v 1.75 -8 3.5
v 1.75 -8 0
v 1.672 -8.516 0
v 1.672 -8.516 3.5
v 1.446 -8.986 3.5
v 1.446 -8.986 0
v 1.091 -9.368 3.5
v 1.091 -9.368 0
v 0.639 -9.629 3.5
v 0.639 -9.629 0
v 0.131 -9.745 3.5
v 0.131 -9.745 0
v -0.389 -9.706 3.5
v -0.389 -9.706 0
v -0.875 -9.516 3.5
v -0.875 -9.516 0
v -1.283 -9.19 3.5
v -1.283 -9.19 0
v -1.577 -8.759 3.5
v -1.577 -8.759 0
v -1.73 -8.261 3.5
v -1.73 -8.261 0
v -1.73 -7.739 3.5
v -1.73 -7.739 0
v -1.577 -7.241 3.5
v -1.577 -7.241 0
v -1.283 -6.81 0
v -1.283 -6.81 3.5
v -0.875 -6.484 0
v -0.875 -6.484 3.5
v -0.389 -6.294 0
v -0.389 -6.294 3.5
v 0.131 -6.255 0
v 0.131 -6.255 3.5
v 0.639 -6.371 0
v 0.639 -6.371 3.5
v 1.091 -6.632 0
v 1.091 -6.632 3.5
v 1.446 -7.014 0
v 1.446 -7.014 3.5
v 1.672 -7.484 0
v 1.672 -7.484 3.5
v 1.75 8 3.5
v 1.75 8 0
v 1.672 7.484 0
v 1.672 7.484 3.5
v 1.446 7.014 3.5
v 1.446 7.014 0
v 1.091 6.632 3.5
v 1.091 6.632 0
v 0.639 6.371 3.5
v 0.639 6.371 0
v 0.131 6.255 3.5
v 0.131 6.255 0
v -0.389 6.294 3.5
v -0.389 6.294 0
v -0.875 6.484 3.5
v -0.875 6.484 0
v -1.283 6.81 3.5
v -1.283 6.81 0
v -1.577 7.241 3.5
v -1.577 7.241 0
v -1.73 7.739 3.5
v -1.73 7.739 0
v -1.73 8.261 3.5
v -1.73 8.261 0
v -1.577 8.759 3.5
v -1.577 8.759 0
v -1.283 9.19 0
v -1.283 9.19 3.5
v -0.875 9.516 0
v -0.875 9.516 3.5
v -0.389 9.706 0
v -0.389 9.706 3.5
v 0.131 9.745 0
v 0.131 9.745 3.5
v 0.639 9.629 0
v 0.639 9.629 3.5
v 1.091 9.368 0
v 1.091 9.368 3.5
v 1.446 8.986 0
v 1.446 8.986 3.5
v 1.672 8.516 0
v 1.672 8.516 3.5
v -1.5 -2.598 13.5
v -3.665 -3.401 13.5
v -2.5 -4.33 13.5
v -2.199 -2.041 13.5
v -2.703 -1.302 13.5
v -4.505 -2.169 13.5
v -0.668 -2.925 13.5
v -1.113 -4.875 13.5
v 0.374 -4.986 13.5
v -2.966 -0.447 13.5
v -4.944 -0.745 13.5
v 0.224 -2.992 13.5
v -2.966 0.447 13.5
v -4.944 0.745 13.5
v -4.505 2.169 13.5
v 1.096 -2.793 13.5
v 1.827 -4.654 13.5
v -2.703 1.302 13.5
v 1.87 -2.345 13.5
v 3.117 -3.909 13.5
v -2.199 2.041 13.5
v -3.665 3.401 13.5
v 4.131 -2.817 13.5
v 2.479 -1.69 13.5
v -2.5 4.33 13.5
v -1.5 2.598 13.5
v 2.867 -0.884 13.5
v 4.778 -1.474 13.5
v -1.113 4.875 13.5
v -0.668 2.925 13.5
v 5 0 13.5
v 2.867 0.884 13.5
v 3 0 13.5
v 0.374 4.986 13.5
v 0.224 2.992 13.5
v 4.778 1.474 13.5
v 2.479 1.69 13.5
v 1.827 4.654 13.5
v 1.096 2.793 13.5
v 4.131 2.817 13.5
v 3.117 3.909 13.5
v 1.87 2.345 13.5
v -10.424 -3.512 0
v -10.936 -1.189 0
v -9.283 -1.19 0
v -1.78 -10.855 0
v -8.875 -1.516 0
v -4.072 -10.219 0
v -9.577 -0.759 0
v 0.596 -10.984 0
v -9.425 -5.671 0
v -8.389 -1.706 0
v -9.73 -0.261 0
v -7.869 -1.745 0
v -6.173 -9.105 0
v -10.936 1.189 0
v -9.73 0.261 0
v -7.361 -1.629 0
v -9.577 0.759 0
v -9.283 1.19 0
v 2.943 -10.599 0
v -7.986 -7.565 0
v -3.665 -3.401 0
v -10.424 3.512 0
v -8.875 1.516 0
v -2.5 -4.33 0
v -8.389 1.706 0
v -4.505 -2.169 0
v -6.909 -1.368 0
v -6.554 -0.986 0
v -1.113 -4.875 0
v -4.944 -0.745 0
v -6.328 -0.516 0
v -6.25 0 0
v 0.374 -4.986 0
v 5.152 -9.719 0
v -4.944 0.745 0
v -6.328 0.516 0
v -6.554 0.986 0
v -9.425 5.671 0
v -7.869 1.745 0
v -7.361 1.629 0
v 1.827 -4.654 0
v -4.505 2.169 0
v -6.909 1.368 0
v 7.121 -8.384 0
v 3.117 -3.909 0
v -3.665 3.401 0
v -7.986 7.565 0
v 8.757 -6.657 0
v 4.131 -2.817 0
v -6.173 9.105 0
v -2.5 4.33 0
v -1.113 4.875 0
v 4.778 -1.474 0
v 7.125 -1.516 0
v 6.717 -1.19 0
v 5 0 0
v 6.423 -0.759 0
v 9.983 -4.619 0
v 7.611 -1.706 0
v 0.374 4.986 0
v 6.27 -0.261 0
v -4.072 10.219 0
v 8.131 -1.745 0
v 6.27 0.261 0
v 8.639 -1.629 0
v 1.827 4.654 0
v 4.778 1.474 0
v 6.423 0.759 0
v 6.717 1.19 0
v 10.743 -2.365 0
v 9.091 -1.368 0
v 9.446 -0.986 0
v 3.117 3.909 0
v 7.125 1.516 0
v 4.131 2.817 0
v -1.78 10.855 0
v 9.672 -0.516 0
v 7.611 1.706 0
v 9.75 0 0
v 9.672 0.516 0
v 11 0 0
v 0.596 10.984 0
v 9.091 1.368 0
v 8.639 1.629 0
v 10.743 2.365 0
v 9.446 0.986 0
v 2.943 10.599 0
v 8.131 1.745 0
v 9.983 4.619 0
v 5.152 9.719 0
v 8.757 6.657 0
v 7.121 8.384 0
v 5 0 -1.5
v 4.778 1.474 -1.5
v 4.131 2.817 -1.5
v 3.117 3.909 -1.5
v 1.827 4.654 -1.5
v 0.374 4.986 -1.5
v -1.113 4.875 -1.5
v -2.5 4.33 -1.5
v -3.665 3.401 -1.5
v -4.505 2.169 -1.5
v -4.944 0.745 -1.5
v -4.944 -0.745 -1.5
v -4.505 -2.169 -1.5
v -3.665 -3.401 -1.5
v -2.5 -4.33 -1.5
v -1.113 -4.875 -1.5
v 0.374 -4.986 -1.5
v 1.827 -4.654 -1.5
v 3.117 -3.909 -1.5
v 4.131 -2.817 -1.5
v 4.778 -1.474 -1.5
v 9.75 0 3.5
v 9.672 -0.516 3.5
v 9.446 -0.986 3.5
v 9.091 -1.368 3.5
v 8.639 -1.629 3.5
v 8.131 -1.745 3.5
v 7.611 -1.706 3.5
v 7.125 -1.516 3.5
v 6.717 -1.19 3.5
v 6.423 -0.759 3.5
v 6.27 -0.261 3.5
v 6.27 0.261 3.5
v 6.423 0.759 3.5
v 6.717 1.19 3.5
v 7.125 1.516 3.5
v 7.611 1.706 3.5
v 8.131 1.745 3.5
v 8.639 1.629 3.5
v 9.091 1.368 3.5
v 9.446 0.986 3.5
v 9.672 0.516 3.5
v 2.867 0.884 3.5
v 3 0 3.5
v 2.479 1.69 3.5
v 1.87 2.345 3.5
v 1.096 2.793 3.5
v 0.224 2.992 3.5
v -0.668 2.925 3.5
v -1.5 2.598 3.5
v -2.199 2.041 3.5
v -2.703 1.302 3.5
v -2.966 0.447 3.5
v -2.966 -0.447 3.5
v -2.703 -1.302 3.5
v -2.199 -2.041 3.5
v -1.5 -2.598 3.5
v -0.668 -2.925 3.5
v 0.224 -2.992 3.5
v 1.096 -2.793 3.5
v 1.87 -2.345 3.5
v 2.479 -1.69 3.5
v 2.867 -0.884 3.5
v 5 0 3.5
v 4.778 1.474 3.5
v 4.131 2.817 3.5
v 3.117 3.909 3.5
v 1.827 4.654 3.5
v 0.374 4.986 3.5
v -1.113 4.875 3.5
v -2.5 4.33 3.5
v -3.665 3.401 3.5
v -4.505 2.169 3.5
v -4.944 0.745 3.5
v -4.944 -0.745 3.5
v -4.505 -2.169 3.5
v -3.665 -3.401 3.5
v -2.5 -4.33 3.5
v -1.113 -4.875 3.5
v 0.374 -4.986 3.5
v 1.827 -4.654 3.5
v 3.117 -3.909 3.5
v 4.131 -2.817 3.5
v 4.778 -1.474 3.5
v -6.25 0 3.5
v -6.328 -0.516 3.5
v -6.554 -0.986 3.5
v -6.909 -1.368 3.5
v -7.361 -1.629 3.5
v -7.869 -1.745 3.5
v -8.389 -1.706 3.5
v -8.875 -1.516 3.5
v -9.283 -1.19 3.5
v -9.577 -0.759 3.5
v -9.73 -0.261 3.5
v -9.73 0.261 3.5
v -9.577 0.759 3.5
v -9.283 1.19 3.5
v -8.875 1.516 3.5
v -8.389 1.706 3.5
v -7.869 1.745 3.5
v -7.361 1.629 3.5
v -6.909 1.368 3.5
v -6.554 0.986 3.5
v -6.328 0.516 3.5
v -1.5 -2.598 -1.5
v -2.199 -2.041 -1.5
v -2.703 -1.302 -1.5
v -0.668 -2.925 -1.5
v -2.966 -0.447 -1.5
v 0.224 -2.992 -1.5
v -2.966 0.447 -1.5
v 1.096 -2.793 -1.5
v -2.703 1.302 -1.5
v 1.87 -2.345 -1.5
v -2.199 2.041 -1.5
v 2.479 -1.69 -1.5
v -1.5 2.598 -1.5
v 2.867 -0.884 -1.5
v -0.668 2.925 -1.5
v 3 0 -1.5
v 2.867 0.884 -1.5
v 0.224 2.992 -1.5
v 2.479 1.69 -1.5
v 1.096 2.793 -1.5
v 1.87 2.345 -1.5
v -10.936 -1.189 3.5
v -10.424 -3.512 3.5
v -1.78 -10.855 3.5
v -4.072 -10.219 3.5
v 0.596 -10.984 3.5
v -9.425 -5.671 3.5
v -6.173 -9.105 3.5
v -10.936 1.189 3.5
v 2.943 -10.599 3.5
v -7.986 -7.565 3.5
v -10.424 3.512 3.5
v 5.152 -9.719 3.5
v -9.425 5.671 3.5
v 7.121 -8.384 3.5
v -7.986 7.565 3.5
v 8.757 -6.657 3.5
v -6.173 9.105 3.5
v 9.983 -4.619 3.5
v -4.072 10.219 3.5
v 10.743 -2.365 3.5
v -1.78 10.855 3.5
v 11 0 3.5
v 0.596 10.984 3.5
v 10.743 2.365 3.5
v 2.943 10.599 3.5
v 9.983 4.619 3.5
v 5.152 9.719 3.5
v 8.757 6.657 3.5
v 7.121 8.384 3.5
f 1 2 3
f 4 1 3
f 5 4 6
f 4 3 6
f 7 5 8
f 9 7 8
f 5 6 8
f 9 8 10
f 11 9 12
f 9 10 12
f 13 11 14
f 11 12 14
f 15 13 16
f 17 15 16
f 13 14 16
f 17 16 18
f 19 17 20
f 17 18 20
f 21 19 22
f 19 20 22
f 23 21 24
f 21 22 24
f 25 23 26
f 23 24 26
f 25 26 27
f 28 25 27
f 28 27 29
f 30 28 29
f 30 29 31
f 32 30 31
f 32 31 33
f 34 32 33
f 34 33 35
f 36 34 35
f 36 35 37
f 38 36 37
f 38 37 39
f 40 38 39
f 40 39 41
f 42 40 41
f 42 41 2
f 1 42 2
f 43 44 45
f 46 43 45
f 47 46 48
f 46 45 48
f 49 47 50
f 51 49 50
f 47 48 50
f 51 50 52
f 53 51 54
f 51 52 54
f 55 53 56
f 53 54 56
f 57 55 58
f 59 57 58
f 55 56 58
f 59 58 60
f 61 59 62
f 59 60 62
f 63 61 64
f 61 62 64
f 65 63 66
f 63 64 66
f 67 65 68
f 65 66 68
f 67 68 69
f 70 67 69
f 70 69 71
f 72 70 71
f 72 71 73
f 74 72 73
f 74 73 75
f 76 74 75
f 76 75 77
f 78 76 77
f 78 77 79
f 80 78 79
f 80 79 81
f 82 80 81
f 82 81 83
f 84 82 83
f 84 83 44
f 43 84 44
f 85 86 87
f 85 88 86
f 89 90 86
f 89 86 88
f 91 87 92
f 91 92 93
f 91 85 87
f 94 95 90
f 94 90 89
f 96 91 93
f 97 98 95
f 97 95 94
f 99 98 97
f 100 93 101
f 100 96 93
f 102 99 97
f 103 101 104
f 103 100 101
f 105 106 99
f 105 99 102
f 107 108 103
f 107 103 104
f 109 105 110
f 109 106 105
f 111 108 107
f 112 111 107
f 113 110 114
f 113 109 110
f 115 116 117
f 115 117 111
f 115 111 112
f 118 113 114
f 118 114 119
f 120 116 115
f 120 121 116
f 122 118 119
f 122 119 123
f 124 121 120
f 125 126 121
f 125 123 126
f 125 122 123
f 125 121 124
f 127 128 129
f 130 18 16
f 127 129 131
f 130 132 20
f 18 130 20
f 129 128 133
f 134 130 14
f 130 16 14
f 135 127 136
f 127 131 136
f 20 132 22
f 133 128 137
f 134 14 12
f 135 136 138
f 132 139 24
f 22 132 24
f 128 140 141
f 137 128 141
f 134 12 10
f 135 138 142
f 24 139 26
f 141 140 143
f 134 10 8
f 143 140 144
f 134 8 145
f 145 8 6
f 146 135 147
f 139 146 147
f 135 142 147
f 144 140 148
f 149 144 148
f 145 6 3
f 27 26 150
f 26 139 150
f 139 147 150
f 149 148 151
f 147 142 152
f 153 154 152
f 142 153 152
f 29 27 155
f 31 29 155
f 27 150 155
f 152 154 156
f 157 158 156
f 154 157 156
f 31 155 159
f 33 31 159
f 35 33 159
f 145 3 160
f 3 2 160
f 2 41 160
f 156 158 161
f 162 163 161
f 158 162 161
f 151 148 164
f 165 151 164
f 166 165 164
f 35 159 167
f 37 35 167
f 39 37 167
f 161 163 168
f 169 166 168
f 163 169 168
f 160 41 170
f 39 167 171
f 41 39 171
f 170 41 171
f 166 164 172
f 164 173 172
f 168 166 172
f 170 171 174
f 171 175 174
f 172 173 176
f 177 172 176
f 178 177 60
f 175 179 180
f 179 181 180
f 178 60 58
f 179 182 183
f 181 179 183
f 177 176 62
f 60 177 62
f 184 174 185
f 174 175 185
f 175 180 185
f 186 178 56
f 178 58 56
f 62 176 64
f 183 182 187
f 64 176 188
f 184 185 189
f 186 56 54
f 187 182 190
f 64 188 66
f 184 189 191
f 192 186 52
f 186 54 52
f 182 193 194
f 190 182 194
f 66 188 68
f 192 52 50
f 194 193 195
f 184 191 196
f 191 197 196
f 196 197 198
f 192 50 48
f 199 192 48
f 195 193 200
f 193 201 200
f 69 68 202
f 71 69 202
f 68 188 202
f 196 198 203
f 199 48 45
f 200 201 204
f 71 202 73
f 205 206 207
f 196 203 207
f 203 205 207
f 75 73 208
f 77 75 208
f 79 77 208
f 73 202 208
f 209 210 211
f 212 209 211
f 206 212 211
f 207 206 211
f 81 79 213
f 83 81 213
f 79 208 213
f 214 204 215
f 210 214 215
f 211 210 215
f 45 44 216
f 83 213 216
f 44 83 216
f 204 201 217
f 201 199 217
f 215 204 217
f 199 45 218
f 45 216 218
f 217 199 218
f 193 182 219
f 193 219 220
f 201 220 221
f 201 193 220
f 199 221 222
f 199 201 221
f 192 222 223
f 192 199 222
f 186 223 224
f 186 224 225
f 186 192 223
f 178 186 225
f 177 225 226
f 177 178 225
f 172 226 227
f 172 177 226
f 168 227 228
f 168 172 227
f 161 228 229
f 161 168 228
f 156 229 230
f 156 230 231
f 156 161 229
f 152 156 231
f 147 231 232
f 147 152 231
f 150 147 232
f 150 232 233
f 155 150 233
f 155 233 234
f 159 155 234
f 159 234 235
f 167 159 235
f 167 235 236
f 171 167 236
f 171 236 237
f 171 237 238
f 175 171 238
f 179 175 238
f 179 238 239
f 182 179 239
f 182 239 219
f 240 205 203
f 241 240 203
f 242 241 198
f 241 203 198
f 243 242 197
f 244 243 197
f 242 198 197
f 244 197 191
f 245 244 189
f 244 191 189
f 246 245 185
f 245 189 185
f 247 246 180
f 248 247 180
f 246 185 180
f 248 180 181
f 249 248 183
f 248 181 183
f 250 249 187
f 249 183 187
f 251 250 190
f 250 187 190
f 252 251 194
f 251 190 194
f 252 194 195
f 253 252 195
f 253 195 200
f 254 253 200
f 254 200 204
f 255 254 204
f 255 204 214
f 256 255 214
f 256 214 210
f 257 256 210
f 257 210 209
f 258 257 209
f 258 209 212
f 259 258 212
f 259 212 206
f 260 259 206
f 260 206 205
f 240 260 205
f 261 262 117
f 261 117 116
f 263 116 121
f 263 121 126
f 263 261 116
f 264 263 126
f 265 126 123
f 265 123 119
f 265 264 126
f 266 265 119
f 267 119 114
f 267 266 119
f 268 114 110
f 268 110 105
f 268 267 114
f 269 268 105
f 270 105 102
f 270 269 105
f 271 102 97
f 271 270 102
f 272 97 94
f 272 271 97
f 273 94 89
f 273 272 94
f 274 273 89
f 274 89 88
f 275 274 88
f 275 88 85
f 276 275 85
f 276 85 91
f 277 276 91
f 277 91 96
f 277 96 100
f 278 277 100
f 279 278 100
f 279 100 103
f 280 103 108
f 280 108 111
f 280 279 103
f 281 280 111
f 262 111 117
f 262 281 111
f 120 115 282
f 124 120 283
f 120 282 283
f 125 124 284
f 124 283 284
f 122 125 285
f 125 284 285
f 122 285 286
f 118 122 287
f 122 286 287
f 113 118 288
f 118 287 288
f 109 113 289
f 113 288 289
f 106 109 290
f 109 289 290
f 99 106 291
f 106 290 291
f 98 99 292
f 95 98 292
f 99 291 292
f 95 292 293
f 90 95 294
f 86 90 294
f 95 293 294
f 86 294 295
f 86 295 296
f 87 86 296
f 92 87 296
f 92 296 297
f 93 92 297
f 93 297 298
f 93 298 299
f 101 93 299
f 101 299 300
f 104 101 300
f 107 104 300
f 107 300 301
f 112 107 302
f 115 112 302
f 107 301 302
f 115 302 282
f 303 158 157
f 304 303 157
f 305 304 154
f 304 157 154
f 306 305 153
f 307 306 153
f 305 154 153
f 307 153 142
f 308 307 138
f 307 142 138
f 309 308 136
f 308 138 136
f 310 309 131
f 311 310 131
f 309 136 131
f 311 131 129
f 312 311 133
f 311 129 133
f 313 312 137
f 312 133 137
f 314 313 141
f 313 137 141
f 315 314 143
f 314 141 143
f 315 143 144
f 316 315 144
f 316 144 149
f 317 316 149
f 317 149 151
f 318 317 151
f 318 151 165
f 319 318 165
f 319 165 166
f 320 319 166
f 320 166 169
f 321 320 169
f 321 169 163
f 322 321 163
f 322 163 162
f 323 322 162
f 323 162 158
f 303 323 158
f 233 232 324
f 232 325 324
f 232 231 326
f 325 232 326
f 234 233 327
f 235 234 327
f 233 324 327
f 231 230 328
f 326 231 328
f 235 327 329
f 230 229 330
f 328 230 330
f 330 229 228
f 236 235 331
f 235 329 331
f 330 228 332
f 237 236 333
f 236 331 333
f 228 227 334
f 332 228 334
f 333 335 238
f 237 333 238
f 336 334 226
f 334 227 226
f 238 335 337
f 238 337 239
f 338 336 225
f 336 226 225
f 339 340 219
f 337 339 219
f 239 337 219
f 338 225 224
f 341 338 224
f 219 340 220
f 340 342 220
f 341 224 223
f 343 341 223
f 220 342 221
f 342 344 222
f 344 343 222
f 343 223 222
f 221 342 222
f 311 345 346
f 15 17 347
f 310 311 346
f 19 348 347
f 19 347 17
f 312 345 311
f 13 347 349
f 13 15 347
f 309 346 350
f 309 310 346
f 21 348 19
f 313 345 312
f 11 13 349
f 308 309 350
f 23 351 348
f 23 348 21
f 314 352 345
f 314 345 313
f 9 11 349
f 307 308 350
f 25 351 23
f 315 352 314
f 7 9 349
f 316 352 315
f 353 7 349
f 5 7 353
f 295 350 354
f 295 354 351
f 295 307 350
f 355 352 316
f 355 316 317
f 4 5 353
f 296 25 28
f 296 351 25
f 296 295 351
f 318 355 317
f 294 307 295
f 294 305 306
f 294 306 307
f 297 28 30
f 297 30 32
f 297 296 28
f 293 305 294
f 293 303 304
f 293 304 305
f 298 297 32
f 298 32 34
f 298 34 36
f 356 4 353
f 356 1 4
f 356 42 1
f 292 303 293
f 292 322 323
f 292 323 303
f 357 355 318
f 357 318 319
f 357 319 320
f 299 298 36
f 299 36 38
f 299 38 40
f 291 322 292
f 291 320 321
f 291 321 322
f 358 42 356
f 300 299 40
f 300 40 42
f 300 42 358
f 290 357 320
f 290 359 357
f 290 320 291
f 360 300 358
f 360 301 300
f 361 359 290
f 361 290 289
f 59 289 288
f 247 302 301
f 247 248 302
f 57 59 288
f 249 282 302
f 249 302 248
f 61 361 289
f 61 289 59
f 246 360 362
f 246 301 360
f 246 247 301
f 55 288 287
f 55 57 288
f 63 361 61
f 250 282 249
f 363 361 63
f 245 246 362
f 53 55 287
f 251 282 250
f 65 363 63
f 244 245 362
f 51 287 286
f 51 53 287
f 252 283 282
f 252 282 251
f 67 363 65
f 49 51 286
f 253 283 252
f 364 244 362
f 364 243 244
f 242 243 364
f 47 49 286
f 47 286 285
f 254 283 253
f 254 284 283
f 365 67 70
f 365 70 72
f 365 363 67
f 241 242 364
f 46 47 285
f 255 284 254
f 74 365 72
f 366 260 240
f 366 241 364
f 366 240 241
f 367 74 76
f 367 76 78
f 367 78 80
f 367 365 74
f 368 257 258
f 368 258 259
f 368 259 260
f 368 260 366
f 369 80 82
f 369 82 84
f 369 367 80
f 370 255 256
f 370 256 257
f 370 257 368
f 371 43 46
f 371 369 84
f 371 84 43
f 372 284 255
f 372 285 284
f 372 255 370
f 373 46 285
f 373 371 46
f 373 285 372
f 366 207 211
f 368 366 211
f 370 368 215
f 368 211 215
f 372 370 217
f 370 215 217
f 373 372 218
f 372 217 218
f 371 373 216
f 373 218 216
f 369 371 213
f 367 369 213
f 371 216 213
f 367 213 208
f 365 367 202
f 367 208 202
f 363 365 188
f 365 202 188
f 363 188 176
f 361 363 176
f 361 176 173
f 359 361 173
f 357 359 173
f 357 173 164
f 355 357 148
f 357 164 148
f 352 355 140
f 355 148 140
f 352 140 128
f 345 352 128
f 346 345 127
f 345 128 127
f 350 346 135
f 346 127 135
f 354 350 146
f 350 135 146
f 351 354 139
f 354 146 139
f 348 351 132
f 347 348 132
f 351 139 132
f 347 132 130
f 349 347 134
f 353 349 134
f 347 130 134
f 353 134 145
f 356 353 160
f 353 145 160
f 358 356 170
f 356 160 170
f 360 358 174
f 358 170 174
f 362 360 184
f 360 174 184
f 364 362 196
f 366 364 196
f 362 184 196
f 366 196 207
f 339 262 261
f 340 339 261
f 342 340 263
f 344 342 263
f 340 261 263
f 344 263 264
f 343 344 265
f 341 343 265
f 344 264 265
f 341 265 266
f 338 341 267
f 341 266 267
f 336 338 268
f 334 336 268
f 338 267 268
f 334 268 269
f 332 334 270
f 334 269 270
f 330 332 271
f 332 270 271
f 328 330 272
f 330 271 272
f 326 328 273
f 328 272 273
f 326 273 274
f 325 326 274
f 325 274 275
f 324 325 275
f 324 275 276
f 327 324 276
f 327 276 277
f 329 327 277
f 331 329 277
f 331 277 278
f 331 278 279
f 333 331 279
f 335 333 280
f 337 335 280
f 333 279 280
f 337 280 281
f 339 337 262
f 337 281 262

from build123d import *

# Parameters (mm, degrees)
F0_R     = 11
F0_R_2   = 4
F1_DEPTH = 3.5
F2_R     = 5
F2_R_2   = 3
F3_DEPTH = 10
F4_DEPTH = 5
F5_R     = 1.75
F6_DEPTH = 25


with BuildPart() as f1:
    # F0 (on Top) → F1 (new body)
    with BuildSketch(Plane.XY):
        Circle(F0_R)
        Circle(F0_R_2, mode=Mode.SUBTRACT)
    extrude(amount=F1_DEPTH)

    # F2 (on face) → F3 (join)
    with BuildSketch(Plane.XY.offset(3.5)):
        Circle(F2_R)
        Circle(F2_R_2, mode=Mode.SUBTRACT)
    extrude(amount=F3_DEPTH)

    # F2 (on face) → F4 (join)
    with BuildSketch(Plane.XY.offset(3.5)):
        Circle(F2_R)
        Circle(F2_R_2, mode=Mode.SUBTRACT)
    extrude(amount=-F4_DEPTH)

    # F5 (on face) → F6 (cut)
    with BuildSketch(Plane(origin=(0, 0, 0), x_dir=(1, 0, 0), z_dir=(0, 0, -1))):
        with Locations((-8, 0)):
            Circle(F5_R)
        with Locations((0, 8)):
            Circle(F5_R)
        with Locations((8, 0)):
            Circle(F5_R)
        with Locations((0, -8)):
            Circle(F5_R)
    extrude(amount=-F6_DEPTH, mode=Mode.SUBTRACT)


solid = f1.part
